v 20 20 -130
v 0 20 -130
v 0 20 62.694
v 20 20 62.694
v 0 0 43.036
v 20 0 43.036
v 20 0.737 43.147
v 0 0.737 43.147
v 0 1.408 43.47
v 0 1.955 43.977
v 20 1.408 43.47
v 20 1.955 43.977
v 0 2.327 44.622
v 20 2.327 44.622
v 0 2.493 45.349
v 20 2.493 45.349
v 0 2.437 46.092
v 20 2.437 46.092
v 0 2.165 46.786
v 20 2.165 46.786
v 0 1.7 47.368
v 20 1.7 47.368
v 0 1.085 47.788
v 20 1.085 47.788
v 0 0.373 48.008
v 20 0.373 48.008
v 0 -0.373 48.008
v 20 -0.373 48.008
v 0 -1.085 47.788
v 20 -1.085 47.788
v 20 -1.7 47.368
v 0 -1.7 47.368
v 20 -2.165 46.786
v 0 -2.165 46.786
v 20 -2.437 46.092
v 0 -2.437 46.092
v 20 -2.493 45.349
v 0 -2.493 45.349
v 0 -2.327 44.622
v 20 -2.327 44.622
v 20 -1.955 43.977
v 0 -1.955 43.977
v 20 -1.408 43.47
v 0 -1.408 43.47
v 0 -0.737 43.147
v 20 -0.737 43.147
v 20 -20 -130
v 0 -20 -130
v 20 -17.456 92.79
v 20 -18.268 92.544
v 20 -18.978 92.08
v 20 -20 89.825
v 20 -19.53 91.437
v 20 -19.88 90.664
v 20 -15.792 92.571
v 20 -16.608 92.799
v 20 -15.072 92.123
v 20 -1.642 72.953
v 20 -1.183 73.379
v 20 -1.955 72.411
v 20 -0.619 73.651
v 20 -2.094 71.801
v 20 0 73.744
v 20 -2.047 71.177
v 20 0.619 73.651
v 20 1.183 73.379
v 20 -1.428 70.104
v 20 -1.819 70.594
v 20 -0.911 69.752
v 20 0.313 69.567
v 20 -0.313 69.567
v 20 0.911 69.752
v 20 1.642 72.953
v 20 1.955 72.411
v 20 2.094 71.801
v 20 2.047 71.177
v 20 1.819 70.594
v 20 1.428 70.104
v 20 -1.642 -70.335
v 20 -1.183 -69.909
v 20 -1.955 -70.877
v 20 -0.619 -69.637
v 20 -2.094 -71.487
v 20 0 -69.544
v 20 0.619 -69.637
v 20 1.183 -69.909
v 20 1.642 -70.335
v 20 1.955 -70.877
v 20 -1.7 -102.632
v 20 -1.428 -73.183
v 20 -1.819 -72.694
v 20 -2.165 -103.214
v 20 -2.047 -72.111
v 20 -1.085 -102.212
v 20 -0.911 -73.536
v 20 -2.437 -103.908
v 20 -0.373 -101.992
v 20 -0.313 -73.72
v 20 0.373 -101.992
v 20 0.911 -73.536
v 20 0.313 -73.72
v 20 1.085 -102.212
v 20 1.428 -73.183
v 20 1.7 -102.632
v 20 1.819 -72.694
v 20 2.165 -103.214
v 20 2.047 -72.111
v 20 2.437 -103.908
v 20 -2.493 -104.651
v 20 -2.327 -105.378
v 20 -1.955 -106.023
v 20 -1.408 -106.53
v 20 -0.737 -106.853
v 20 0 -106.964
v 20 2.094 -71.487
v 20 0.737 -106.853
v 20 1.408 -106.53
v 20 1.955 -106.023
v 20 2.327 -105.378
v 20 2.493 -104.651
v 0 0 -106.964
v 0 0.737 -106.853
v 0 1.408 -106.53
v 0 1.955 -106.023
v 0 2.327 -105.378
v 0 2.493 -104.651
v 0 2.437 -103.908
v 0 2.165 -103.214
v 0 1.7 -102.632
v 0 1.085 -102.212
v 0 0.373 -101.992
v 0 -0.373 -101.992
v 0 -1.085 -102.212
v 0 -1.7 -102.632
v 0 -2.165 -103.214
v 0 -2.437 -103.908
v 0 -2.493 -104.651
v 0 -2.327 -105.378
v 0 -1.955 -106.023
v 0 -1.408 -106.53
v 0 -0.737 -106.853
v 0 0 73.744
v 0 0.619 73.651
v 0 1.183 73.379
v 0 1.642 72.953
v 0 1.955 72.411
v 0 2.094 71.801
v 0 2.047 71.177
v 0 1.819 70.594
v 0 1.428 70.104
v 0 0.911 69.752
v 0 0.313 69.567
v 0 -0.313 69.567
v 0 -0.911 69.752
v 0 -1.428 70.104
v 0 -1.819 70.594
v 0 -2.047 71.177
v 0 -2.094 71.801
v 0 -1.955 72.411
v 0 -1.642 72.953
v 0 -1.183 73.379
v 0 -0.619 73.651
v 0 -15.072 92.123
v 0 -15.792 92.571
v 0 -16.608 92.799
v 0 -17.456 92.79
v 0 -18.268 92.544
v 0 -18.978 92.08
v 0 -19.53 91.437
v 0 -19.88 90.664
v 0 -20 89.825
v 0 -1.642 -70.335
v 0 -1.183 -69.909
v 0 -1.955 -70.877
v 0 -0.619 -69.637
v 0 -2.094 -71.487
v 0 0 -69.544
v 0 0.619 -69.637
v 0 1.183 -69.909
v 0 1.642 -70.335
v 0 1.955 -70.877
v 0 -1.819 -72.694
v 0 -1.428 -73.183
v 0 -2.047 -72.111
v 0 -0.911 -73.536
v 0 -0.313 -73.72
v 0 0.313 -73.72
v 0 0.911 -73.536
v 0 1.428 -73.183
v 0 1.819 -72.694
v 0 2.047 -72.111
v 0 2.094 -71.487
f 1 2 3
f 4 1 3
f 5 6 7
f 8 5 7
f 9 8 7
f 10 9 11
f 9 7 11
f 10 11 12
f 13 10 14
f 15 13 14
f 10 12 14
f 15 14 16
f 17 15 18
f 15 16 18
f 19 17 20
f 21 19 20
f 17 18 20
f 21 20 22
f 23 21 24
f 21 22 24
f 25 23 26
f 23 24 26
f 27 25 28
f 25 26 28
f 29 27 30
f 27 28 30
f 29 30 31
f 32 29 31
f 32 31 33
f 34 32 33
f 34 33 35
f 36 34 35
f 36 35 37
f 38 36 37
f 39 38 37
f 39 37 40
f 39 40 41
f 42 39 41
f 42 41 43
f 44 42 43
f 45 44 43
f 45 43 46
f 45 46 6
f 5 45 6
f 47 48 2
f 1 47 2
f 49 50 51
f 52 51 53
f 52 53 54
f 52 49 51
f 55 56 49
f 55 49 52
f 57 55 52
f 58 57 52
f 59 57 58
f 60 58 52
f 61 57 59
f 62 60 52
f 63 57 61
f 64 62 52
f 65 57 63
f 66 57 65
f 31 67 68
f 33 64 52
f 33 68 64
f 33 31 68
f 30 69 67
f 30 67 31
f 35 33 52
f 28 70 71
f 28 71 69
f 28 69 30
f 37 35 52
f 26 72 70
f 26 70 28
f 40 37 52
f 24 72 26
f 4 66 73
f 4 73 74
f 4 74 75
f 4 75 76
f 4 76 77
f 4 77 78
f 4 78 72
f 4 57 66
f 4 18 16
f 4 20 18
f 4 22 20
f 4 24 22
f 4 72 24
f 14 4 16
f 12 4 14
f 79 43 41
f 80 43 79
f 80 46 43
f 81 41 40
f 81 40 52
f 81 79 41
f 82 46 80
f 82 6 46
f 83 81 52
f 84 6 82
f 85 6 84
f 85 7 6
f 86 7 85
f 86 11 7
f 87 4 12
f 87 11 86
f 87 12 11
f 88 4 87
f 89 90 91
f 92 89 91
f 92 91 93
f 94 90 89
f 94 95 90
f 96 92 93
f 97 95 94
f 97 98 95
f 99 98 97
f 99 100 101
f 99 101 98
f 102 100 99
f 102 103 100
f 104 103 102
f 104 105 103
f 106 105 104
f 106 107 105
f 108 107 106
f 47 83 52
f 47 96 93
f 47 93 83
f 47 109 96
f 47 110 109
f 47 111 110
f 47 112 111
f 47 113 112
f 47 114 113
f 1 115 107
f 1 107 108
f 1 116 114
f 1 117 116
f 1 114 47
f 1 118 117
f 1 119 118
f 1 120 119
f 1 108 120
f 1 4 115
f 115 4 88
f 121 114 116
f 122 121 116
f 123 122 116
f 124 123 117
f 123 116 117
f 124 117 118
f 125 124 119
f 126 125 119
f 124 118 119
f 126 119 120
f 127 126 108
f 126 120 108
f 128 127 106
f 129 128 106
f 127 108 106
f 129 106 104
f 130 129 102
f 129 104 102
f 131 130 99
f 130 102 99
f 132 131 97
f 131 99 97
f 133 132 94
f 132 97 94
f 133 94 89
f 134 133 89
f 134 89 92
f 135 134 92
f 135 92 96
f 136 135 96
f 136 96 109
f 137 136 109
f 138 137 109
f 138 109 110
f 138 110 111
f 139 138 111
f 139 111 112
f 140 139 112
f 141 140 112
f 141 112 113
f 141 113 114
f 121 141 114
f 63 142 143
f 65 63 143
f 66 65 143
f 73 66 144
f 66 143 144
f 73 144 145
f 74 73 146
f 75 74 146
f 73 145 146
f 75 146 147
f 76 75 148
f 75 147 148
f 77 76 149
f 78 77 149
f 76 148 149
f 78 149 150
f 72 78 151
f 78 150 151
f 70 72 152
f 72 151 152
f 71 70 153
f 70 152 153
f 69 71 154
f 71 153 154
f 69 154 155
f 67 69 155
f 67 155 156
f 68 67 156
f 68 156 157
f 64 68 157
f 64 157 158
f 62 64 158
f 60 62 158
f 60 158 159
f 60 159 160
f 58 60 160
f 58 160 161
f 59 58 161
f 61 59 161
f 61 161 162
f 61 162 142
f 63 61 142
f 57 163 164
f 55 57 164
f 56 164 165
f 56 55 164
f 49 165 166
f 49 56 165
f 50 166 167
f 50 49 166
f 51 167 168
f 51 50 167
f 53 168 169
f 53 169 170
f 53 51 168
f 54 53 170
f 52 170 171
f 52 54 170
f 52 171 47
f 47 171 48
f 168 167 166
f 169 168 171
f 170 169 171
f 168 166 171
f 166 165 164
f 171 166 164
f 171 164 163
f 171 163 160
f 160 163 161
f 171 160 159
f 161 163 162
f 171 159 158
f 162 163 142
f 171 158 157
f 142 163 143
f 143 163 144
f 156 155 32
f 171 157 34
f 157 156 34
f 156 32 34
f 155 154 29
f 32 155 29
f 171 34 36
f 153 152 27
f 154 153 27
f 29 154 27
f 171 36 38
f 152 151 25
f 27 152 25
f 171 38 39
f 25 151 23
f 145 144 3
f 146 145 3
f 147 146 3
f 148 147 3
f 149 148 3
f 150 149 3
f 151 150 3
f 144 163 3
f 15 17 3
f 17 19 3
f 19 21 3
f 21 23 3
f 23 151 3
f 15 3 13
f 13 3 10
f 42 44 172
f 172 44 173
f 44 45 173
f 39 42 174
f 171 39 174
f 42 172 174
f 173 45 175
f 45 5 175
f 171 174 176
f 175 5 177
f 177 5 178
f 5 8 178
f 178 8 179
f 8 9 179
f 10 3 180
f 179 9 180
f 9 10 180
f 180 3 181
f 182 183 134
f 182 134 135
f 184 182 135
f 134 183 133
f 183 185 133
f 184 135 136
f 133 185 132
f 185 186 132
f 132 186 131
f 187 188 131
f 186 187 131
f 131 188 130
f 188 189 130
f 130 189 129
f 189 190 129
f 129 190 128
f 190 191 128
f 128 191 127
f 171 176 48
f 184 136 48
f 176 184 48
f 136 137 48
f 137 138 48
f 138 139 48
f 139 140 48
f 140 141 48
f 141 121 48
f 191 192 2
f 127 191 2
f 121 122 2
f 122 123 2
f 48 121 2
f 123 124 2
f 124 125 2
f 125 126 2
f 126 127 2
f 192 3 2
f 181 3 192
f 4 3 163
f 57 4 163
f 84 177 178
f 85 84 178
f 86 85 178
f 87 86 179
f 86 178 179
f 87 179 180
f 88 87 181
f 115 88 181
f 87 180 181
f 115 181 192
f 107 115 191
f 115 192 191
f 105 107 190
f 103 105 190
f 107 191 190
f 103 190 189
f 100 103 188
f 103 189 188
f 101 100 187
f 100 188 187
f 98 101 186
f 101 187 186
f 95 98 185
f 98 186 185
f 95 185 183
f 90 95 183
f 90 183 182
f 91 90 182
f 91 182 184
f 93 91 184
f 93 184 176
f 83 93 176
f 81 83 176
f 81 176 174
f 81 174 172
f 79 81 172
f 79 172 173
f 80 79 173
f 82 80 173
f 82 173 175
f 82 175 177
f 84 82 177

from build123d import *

# Parameters (mm, degrees)
BOSS_EXTRUDE1_DEPTH    = 20
M6_TAPPED_HOLE1_D      = 5
FILLET1_R              = 3
OTW_R_GWINTOWANY_M51_D = 4.2


with BuildPart() as part:
    # Sketch3 → Boss-Extrude1 (new body)
    with BuildSketch(Plane(origin=(0, 0, 0), x_dir=(0, 0, -1), z_dir=(1, 0, 0))):
        Polygon((-62.694317427, 20), (-96.258302674, -20), (130, -20), (130, 20), align=None)
    extrude(amount=BOSS_EXTRUDE1_DEPTH)

    # M6 Tapped Hole1 (through all)
    with Locations(Plane.ZY):
        with Locations((45.535720528, 0), (-104.464279472, 0)):
            Hole(M6_TAPPED_HOLE1_D / 2)

    # Fillet1
    fillet1_edges = [part.edges().sort_by_distance(p)[0] for p in [
        (10, -20, 96.258302674),
    ]]
    fillet(fillet1_edges, radius=FILLET1_R)

    # Otwór gwintowany M51 (through all)
    with Locations(Plane(origin=(20, 0, 0), x_dir=(0, 0, -1), z_dir=(1, 0, 0))):
        with Locations((-71.643866315, 0), (71.643866315, 0)):
            Hole(OTW_R_GWINTOWANY_M51_D / 2)


solid = part.part
